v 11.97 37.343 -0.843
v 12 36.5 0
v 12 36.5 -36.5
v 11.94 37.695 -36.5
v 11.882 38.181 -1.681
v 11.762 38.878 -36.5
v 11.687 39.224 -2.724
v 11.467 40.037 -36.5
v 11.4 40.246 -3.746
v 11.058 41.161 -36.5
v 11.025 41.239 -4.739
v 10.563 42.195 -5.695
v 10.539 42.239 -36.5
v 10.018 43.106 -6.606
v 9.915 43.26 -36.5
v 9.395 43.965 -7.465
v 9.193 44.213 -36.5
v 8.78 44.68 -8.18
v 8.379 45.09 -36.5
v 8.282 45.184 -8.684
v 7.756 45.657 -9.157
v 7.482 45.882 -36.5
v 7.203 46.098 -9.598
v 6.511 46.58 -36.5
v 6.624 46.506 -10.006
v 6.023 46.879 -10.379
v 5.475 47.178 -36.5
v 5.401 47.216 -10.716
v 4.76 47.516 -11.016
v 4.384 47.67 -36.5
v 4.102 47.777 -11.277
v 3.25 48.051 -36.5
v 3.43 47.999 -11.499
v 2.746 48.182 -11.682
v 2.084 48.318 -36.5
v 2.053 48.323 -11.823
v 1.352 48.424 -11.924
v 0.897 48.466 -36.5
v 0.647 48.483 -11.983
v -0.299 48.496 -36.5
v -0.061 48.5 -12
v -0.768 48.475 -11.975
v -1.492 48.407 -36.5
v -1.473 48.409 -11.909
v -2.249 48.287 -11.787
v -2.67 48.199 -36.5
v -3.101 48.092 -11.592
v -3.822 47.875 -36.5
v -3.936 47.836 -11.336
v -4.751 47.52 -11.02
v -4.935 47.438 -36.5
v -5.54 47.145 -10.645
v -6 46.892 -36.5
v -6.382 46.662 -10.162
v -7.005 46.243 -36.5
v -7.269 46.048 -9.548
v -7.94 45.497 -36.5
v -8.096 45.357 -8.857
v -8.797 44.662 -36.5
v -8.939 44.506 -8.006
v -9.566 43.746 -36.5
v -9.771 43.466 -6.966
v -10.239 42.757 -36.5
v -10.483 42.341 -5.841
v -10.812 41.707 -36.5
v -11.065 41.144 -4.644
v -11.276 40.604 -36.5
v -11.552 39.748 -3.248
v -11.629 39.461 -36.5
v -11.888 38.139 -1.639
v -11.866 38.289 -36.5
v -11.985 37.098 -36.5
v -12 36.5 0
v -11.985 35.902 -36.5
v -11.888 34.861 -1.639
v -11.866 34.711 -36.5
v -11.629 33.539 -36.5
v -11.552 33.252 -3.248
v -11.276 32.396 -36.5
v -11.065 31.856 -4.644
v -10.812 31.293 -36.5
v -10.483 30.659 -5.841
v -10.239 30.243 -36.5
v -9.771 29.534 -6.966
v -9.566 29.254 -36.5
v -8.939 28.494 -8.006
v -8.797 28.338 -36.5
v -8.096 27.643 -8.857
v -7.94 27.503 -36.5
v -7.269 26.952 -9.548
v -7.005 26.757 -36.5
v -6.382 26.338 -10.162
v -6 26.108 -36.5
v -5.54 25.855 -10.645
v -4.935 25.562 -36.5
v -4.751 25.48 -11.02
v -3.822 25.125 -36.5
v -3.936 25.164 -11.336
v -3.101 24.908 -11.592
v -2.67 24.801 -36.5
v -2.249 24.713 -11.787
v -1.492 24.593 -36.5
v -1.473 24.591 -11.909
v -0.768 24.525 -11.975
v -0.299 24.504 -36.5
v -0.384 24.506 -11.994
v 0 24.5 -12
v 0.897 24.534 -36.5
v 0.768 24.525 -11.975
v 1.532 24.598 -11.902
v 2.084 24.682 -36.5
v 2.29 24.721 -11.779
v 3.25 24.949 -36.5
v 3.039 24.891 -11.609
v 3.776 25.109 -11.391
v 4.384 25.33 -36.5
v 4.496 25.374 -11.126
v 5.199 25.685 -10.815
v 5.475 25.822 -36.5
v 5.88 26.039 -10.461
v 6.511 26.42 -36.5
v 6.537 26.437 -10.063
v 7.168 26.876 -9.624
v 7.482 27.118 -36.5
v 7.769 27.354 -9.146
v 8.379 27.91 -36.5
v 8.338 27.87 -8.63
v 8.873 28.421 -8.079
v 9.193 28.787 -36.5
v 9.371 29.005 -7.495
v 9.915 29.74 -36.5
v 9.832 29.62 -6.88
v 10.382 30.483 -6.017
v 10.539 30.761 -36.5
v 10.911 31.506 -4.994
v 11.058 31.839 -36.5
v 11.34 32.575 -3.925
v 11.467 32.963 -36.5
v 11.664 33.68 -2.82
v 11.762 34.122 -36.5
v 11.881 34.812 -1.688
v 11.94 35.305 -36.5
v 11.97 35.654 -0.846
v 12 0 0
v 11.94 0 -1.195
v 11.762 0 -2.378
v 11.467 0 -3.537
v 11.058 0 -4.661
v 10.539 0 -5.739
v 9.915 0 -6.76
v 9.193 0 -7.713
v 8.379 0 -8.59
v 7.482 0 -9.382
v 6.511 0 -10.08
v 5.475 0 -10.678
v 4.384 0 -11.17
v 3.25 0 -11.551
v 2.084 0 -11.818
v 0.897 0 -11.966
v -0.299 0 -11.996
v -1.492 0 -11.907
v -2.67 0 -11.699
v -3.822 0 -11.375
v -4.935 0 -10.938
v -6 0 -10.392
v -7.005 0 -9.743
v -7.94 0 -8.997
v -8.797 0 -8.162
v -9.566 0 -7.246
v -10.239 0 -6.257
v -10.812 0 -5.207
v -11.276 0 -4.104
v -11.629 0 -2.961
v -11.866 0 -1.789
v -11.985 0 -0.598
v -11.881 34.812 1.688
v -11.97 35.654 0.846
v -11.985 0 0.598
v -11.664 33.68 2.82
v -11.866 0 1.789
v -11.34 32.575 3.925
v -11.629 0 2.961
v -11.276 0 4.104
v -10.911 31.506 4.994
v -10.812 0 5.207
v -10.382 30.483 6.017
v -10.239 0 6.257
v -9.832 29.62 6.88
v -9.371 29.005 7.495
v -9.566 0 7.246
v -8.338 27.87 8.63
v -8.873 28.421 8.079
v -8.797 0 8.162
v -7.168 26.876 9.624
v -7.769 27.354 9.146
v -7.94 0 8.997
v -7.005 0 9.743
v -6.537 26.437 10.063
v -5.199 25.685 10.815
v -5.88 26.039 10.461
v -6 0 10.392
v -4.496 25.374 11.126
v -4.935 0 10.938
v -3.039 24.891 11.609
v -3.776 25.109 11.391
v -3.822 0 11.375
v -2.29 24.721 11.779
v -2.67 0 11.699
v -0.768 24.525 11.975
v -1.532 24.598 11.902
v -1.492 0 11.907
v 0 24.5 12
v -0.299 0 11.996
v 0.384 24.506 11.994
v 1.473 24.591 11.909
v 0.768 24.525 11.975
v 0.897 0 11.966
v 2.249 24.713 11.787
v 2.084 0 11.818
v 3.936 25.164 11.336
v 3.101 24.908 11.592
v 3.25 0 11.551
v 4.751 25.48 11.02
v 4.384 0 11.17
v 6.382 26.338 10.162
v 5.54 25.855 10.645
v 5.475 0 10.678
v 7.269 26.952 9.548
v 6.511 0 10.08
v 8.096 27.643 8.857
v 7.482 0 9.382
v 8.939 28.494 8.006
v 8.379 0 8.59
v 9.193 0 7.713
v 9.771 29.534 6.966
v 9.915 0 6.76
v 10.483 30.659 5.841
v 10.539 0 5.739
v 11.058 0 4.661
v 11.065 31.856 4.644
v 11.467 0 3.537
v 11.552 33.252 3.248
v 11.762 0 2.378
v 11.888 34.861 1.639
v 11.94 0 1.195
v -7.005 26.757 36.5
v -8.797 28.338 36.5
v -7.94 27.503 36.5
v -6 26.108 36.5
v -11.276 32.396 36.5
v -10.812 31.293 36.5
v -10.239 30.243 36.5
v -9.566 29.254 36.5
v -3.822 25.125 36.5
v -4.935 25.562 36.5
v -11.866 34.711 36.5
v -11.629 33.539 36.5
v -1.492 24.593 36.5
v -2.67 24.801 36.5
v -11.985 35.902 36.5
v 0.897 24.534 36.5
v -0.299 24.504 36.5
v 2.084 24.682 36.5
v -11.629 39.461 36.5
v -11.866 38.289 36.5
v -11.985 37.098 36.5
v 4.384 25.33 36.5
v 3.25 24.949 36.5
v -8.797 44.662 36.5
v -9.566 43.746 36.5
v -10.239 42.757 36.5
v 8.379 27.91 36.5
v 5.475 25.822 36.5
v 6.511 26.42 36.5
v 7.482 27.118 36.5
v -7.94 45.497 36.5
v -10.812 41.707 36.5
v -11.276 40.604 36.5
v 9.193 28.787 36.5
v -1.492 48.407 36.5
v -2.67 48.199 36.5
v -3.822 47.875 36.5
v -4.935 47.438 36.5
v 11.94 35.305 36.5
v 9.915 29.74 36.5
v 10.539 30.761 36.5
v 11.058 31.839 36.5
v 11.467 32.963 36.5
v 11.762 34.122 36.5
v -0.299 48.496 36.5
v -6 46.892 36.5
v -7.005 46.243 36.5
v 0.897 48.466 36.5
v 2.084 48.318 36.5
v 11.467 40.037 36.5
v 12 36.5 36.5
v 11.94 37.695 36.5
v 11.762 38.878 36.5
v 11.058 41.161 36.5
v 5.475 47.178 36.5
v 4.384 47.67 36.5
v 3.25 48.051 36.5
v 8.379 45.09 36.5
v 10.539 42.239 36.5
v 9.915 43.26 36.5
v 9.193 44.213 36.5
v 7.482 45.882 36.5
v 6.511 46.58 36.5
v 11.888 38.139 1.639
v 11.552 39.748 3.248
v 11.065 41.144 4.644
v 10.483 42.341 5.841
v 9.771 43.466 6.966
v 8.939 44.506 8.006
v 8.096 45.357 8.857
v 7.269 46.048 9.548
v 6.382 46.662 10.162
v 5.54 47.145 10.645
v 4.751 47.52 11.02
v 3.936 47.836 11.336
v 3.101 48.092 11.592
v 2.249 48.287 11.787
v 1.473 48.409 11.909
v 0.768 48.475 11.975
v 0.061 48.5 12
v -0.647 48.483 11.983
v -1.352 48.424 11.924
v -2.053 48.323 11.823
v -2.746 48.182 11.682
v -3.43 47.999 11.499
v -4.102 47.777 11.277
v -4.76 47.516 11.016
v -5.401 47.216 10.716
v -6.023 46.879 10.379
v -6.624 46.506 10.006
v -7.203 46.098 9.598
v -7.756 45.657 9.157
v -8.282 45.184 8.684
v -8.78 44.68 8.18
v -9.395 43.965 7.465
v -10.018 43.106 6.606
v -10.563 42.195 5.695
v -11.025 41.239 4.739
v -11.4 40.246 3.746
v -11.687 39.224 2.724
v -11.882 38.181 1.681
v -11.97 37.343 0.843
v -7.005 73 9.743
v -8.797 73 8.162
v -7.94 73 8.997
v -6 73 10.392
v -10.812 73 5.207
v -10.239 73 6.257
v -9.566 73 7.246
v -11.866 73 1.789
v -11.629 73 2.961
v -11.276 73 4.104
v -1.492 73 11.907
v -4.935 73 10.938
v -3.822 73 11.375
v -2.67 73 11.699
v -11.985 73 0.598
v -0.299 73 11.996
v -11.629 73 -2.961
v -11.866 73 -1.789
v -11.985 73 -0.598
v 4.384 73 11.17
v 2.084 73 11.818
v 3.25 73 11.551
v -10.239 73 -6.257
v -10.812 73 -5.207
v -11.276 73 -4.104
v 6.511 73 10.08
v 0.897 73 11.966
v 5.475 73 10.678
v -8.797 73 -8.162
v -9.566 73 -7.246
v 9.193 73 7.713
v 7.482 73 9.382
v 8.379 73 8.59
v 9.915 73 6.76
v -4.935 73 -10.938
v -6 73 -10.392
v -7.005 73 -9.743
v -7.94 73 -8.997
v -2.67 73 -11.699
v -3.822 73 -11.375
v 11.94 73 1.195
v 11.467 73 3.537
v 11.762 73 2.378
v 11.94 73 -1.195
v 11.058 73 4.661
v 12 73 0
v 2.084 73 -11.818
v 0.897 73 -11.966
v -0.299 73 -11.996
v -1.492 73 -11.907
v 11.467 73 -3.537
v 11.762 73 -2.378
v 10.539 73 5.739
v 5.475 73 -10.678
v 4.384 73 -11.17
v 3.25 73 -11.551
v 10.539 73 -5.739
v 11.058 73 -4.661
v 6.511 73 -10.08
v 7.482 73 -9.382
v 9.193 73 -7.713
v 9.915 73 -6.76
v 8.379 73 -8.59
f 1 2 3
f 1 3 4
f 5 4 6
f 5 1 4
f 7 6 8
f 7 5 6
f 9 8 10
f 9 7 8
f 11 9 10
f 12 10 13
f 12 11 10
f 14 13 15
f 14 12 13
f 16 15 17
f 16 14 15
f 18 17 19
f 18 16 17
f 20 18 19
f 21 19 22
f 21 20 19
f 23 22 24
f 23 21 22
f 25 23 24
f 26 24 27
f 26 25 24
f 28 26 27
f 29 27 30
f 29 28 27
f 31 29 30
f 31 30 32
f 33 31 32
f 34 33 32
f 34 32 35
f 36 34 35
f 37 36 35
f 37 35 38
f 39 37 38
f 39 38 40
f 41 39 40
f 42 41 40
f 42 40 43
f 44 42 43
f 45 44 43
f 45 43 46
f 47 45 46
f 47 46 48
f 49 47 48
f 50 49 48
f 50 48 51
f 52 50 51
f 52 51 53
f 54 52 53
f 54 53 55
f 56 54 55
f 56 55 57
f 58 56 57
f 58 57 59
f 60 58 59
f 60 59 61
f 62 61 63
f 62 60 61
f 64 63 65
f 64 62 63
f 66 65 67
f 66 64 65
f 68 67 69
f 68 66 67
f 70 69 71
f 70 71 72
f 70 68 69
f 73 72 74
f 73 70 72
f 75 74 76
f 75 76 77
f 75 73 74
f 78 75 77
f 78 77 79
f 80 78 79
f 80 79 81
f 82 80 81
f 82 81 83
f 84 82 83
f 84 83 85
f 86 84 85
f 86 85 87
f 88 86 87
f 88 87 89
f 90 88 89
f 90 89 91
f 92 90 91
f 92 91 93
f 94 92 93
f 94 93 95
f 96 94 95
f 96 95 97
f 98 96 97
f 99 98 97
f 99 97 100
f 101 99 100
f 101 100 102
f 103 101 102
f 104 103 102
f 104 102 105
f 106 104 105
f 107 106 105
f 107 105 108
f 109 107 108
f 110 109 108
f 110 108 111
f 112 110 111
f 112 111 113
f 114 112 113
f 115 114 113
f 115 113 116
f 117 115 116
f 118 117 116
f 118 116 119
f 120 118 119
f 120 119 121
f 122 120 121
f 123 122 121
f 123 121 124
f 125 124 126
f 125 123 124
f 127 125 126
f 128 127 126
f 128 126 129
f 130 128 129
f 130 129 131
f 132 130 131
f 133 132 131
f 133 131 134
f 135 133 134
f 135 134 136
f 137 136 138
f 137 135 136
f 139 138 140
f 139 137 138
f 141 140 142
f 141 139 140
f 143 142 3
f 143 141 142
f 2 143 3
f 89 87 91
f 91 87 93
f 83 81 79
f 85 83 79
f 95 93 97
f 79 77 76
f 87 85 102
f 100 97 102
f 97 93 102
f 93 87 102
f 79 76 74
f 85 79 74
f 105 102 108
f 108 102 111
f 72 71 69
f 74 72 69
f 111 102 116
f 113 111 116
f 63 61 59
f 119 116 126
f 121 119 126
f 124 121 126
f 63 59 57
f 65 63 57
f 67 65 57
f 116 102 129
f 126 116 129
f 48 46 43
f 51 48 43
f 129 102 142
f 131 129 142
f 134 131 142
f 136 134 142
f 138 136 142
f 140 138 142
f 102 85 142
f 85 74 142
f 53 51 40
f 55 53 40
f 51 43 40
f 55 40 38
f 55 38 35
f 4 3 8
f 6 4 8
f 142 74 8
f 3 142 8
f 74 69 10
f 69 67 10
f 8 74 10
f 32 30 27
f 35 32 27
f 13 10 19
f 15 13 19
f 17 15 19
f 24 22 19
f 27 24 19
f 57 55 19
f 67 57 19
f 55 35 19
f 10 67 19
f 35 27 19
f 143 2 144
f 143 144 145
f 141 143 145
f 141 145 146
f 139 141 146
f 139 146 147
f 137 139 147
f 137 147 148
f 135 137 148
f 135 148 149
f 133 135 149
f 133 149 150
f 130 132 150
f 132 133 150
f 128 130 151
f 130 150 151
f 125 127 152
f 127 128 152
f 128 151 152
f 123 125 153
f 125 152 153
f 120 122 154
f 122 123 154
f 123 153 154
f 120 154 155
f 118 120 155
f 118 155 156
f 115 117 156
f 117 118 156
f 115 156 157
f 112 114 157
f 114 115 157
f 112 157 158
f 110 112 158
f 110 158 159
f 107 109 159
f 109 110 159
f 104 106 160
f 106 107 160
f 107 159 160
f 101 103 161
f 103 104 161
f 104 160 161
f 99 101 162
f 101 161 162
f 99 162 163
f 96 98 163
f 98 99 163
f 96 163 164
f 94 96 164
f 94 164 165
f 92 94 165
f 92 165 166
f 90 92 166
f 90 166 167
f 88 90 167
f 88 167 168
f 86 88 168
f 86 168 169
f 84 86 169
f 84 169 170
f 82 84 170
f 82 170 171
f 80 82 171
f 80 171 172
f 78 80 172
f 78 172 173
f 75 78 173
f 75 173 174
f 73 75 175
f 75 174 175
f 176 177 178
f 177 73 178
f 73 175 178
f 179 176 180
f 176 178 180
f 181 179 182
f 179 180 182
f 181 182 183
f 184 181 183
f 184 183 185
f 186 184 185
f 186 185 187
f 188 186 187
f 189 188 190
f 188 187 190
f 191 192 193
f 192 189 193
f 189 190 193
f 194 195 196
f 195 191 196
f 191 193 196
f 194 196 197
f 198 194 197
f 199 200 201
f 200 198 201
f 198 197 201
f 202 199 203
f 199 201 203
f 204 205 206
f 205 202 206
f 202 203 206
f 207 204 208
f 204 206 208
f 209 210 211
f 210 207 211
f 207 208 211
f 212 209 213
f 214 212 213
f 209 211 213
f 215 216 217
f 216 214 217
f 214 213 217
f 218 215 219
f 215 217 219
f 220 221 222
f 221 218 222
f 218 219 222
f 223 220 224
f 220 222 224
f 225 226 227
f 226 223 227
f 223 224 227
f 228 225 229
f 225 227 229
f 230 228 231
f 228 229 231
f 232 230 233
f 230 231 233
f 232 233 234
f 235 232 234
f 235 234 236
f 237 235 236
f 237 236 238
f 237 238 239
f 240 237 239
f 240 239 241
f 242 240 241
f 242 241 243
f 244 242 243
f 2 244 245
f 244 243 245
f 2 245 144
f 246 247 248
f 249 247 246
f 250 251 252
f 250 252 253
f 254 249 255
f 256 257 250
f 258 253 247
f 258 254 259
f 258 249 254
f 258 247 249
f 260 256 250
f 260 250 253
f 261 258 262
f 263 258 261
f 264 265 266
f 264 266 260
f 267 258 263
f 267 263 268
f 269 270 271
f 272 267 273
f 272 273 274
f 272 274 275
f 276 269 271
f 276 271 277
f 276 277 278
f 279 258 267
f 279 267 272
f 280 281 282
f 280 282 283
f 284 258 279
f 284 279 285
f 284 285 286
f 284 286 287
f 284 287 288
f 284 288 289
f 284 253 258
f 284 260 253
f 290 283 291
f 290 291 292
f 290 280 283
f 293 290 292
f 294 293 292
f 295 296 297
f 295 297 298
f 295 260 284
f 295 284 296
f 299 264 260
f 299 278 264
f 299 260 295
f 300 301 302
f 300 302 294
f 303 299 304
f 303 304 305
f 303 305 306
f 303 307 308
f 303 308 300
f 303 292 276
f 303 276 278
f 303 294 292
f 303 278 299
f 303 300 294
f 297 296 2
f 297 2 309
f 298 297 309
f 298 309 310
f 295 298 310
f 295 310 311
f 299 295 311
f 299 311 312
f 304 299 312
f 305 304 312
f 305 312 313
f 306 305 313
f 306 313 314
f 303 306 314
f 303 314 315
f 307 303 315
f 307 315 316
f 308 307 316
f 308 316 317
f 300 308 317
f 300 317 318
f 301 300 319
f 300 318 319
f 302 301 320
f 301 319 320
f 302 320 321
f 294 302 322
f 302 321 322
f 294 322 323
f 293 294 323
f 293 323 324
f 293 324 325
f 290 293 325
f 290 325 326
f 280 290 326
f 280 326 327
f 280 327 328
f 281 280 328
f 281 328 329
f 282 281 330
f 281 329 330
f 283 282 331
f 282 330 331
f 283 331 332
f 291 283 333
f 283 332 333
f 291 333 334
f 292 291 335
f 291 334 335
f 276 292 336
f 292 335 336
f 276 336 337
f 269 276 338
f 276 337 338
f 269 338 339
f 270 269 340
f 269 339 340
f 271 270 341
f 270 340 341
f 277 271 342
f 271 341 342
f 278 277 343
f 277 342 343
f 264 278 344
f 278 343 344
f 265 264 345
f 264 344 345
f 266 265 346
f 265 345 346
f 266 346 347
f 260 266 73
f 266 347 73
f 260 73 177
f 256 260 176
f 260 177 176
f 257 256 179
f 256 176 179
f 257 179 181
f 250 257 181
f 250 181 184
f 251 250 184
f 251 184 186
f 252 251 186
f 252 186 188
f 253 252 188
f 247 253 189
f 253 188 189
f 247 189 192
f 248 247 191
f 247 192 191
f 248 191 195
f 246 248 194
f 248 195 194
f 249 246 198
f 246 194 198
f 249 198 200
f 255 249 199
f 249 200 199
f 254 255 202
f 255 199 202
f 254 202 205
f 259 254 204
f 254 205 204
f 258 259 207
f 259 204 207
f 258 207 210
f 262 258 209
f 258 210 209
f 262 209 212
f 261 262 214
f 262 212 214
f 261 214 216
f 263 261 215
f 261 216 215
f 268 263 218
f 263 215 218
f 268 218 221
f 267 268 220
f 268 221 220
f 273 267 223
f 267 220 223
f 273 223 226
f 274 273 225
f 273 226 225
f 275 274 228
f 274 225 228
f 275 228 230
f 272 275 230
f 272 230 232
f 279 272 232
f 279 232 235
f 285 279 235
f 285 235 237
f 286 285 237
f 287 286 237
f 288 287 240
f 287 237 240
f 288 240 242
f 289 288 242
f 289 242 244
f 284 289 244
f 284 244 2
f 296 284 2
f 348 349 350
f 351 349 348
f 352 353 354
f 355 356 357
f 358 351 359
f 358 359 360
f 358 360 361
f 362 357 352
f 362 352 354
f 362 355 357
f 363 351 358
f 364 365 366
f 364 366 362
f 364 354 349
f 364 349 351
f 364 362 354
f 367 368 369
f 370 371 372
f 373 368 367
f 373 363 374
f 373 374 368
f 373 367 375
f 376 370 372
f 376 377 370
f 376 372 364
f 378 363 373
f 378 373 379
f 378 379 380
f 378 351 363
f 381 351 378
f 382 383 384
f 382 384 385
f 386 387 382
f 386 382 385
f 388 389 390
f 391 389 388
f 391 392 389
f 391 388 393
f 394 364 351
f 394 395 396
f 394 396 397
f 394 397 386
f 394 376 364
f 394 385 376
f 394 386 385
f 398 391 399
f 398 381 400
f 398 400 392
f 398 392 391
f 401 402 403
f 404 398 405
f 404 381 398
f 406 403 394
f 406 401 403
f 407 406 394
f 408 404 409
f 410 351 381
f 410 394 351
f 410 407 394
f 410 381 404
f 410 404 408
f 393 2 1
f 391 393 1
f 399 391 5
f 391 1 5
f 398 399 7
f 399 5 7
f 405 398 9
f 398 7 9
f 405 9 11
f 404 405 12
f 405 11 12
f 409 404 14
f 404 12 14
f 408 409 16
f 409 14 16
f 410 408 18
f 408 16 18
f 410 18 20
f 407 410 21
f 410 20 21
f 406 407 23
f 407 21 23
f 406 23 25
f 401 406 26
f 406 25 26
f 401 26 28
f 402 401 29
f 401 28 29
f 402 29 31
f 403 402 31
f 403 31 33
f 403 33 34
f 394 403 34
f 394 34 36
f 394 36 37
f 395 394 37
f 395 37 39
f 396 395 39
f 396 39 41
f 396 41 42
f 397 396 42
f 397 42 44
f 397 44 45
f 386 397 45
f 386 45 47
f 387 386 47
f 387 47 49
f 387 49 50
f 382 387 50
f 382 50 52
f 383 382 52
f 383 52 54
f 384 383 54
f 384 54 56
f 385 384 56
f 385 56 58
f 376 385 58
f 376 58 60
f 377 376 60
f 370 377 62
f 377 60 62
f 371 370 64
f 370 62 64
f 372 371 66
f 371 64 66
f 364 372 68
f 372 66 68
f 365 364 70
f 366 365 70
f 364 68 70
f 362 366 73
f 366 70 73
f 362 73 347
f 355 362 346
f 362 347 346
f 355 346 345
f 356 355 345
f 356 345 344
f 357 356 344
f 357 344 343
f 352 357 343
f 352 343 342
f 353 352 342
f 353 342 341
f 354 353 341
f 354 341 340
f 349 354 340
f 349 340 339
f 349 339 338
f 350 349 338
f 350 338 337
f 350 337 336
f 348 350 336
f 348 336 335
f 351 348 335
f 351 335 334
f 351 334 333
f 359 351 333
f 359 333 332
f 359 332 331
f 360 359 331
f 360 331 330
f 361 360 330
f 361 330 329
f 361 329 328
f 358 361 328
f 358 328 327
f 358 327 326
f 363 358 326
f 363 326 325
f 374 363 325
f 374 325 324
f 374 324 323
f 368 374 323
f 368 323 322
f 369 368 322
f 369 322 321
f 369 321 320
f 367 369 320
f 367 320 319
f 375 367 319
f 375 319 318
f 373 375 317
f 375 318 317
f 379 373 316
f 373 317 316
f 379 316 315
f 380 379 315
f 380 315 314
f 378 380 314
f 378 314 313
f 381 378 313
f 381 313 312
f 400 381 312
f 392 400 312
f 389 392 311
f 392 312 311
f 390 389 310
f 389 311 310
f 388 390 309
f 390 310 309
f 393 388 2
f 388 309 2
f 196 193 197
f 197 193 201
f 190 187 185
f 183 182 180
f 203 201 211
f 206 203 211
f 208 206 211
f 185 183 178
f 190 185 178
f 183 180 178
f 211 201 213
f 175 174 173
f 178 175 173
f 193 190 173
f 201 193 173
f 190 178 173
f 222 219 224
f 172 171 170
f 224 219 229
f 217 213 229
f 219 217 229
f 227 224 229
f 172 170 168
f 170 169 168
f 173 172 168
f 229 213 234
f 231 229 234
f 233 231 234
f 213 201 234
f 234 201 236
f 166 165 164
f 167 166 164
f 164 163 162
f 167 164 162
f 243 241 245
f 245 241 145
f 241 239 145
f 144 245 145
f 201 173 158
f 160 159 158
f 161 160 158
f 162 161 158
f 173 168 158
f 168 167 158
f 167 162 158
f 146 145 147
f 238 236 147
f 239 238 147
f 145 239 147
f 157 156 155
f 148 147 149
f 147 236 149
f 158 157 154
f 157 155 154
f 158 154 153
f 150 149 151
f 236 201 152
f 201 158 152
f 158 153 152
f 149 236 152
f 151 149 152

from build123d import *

# Parameters (mm, degrees)
SKETCH1_R                = 12
BOSS_EXTRUDE1_DEPTH      = 73
BOSS_EXTRUDE2_DEPTH      = 36.5
BOSS_EXTRUDE2_DEPTH_BACK = 36.5
SKETCH2_R                = 12


with BuildPart() as part:
    # Sketch1 → Boss-Extrude1 (new body)
    with BuildSketch(Plane(origin=(0, 0, 0), x_dir=(1, 0, 0), z_dir=(0, 1, 0))):
        Circle(SKETCH1_R)
    extrude(amount=BOSS_EXTRUDE1_DEPTH)

    # Sketch2 → Boss-Extrude2 (add, two sides: drawn at the far end of the back side and taken through both)
    with BuildSketch(Plane.XY.offset(-BOSS_EXTRUDE2_DEPTH_BACK)):
        with Locations((0, 36.5)):
            Circle(SKETCH2_R)
    extrude(amount=BOSS_EXTRUDE2_DEPTH + BOSS_EXTRUDE2_DEPTH_BACK)


solid = part.part
